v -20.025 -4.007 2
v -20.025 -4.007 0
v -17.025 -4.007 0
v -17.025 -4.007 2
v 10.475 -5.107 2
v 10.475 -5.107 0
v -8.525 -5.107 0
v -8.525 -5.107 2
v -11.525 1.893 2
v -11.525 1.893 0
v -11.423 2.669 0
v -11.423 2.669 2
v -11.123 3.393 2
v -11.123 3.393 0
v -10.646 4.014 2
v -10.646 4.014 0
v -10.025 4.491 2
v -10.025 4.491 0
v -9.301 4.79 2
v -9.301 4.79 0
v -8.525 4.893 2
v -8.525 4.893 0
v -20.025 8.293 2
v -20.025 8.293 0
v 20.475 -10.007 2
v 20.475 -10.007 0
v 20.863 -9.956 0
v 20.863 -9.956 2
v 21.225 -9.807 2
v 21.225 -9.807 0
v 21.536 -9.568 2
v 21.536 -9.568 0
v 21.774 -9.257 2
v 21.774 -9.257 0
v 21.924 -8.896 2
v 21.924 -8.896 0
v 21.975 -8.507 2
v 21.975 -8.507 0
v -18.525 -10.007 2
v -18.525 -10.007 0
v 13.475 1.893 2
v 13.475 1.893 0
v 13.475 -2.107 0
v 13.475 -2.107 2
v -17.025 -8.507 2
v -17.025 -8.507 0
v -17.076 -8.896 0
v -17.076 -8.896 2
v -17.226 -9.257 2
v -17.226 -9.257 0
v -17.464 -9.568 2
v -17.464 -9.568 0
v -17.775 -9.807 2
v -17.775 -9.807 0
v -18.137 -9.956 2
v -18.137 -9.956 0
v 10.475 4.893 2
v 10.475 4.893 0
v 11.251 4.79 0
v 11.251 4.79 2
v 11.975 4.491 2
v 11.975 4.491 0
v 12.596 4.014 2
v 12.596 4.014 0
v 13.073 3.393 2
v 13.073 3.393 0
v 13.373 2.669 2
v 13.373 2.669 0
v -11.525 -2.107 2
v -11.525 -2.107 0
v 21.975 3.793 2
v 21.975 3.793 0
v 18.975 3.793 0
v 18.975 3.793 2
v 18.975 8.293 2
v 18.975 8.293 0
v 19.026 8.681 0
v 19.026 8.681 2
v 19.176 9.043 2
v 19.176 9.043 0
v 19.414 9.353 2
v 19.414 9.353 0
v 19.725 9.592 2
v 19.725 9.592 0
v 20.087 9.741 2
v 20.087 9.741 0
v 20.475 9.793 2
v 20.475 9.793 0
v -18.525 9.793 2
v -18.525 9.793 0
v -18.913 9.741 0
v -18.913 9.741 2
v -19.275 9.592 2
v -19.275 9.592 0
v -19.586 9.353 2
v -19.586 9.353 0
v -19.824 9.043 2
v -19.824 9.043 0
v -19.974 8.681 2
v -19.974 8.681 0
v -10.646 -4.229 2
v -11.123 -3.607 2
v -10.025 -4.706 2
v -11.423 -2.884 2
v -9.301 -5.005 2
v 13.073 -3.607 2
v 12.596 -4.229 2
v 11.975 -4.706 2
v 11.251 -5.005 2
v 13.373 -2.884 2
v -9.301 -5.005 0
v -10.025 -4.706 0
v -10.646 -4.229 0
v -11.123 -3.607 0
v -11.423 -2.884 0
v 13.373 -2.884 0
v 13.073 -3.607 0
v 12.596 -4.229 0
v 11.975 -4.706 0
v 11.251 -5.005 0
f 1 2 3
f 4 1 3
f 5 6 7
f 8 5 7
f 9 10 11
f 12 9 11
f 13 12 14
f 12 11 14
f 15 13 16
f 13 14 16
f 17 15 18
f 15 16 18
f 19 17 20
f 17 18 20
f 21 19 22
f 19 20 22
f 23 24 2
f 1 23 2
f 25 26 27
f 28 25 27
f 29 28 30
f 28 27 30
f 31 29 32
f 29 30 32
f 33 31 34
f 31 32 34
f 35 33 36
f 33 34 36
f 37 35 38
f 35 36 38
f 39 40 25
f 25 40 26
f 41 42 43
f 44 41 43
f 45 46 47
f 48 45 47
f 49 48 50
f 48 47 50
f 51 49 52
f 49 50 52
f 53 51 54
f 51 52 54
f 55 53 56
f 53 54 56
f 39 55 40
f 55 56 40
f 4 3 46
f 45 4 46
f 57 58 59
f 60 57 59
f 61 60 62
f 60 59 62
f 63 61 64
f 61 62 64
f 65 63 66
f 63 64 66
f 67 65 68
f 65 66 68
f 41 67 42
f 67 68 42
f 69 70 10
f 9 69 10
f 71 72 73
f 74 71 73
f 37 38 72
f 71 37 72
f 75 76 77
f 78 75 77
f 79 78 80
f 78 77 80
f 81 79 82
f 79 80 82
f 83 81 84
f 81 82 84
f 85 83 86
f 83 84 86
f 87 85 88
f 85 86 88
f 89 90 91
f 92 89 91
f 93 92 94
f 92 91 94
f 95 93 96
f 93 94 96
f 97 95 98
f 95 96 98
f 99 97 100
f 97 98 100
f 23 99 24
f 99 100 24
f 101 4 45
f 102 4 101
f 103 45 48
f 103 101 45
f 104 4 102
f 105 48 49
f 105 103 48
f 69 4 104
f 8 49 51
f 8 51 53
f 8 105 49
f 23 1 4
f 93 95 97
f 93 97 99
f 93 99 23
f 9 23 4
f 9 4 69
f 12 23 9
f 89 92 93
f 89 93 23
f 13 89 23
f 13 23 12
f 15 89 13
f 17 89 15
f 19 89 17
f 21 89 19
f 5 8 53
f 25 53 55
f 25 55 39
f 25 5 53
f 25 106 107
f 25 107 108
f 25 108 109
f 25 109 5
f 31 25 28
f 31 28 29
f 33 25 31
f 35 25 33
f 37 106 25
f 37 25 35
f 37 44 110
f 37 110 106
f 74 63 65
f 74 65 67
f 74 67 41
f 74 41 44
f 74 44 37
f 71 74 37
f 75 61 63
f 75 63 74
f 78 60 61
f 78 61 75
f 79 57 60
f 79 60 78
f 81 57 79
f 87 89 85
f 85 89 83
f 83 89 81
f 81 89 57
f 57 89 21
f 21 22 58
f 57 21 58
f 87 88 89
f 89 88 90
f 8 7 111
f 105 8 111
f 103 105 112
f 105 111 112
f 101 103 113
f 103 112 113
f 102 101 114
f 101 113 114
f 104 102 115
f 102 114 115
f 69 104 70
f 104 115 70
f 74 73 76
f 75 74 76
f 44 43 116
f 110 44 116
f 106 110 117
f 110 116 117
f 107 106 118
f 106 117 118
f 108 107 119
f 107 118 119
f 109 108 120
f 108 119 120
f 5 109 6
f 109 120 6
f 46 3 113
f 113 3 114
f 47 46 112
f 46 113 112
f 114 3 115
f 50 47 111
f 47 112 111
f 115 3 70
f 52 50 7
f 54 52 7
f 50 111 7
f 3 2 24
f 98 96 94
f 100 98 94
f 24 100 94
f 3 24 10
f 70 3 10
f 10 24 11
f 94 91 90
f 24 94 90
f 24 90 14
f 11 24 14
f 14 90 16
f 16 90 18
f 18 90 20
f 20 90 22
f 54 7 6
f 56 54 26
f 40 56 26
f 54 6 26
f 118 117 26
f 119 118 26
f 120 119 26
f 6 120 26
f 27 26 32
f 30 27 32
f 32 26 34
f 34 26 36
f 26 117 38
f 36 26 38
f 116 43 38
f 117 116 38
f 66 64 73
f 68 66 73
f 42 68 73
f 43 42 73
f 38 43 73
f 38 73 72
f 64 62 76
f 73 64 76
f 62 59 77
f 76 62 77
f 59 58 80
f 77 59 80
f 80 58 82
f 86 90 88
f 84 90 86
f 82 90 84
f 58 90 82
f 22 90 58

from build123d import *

# Parameters (mm, degrees)
F1_DEPTH = 2


with BuildPart() as f1:
    # F0 (on Top) → F1 (new body)
    with BuildSketch(Plane.XY):
        with BuildLine():
            ThreePointArc((-18.525, 9.79253), (-19.58566, 9.35319), (-20.025, 8.29253))
            Line((-20.025, 8.29253), (-20.025, -4.00747))
            Line((-20.025, -4.00747), (-17.025, -4.00747))
            Line((-17.025, -4.00747), (-17.025, 8.29253))
            ThreePointArc((-17.025, 8.29253), (-17.46434, 9.35319), (-18.525, 9.79253))
        make_face()
        with BuildLine():
            Line((20.475, 9.79253), (-18.525, 9.79253))
            ThreePointArc((-18.525, 9.79253), (-17.46434, 9.35319), (-17.025, 8.29253))
            Line((-17.025, 8.29253), (-17.025, -4.00747))
            Line((-17.025, -4.00747), (-17.025, -8.50747))
            ThreePointArc((-17.025, -8.50747), (-17.46434, -9.56813), (-18.525, -10.00747))
            Line((-18.525, -10.00747), (20.475, -10.00747))
            ThreePointArc((20.475, -10.00747), (19.41434, -9.56813), (18.975, -8.50747))
            Line((18.975, -8.50747), (18.975, 3.79253))
            Line((18.975, 3.79253), (18.975, 8.29253))
            ThreePointArc((18.975, 8.29253), (19.41434, 9.35319), (20.475, 9.79253))
        make_face()
        with BuildLine():
            ThreePointArc((-11.525, 1.89253), (-10.64632, 4.01385), (-8.525, 4.89253))
            Line((-8.525, 4.89253), (10.475, 4.89253))
            ThreePointArc((10.475, 4.89253), (12.59632, 4.01385), (13.475, 1.89253))
            Line((13.475, 1.89253), (13.475, -2.10747))
            ThreePointArc((13.475, -2.10747), (12.59632, -4.22879), (10.475, -5.10747))
            Line((10.475, -5.10747), (-8.525, -5.10747))
            ThreePointArc((-8.525, -5.10747), (-10.64632, -4.22879), (-11.525, -2.10747))
            Line((-11.525, -2.10747), (-11.525, 1.89253))
        make_face(mode=Mode.SUBTRACT)
        with BuildLine():
            ThreePointArc((18.975, -8.50747), (19.41434, -9.56813), (20.475, -10.00747))
            ThreePointArc((20.475, -10.00747), (21.53566, -9.56813), (21.975, -8.50747))
            Line((21.975, -8.50747), (21.975, 3.79253))
            Line((21.975, 3.79253), (18.975, 3.79253))
            Line((18.975, 3.79253), (18.975, -8.50747))
        make_face()
    extrude(amount=F1_DEPTH)


solid = f1.part
